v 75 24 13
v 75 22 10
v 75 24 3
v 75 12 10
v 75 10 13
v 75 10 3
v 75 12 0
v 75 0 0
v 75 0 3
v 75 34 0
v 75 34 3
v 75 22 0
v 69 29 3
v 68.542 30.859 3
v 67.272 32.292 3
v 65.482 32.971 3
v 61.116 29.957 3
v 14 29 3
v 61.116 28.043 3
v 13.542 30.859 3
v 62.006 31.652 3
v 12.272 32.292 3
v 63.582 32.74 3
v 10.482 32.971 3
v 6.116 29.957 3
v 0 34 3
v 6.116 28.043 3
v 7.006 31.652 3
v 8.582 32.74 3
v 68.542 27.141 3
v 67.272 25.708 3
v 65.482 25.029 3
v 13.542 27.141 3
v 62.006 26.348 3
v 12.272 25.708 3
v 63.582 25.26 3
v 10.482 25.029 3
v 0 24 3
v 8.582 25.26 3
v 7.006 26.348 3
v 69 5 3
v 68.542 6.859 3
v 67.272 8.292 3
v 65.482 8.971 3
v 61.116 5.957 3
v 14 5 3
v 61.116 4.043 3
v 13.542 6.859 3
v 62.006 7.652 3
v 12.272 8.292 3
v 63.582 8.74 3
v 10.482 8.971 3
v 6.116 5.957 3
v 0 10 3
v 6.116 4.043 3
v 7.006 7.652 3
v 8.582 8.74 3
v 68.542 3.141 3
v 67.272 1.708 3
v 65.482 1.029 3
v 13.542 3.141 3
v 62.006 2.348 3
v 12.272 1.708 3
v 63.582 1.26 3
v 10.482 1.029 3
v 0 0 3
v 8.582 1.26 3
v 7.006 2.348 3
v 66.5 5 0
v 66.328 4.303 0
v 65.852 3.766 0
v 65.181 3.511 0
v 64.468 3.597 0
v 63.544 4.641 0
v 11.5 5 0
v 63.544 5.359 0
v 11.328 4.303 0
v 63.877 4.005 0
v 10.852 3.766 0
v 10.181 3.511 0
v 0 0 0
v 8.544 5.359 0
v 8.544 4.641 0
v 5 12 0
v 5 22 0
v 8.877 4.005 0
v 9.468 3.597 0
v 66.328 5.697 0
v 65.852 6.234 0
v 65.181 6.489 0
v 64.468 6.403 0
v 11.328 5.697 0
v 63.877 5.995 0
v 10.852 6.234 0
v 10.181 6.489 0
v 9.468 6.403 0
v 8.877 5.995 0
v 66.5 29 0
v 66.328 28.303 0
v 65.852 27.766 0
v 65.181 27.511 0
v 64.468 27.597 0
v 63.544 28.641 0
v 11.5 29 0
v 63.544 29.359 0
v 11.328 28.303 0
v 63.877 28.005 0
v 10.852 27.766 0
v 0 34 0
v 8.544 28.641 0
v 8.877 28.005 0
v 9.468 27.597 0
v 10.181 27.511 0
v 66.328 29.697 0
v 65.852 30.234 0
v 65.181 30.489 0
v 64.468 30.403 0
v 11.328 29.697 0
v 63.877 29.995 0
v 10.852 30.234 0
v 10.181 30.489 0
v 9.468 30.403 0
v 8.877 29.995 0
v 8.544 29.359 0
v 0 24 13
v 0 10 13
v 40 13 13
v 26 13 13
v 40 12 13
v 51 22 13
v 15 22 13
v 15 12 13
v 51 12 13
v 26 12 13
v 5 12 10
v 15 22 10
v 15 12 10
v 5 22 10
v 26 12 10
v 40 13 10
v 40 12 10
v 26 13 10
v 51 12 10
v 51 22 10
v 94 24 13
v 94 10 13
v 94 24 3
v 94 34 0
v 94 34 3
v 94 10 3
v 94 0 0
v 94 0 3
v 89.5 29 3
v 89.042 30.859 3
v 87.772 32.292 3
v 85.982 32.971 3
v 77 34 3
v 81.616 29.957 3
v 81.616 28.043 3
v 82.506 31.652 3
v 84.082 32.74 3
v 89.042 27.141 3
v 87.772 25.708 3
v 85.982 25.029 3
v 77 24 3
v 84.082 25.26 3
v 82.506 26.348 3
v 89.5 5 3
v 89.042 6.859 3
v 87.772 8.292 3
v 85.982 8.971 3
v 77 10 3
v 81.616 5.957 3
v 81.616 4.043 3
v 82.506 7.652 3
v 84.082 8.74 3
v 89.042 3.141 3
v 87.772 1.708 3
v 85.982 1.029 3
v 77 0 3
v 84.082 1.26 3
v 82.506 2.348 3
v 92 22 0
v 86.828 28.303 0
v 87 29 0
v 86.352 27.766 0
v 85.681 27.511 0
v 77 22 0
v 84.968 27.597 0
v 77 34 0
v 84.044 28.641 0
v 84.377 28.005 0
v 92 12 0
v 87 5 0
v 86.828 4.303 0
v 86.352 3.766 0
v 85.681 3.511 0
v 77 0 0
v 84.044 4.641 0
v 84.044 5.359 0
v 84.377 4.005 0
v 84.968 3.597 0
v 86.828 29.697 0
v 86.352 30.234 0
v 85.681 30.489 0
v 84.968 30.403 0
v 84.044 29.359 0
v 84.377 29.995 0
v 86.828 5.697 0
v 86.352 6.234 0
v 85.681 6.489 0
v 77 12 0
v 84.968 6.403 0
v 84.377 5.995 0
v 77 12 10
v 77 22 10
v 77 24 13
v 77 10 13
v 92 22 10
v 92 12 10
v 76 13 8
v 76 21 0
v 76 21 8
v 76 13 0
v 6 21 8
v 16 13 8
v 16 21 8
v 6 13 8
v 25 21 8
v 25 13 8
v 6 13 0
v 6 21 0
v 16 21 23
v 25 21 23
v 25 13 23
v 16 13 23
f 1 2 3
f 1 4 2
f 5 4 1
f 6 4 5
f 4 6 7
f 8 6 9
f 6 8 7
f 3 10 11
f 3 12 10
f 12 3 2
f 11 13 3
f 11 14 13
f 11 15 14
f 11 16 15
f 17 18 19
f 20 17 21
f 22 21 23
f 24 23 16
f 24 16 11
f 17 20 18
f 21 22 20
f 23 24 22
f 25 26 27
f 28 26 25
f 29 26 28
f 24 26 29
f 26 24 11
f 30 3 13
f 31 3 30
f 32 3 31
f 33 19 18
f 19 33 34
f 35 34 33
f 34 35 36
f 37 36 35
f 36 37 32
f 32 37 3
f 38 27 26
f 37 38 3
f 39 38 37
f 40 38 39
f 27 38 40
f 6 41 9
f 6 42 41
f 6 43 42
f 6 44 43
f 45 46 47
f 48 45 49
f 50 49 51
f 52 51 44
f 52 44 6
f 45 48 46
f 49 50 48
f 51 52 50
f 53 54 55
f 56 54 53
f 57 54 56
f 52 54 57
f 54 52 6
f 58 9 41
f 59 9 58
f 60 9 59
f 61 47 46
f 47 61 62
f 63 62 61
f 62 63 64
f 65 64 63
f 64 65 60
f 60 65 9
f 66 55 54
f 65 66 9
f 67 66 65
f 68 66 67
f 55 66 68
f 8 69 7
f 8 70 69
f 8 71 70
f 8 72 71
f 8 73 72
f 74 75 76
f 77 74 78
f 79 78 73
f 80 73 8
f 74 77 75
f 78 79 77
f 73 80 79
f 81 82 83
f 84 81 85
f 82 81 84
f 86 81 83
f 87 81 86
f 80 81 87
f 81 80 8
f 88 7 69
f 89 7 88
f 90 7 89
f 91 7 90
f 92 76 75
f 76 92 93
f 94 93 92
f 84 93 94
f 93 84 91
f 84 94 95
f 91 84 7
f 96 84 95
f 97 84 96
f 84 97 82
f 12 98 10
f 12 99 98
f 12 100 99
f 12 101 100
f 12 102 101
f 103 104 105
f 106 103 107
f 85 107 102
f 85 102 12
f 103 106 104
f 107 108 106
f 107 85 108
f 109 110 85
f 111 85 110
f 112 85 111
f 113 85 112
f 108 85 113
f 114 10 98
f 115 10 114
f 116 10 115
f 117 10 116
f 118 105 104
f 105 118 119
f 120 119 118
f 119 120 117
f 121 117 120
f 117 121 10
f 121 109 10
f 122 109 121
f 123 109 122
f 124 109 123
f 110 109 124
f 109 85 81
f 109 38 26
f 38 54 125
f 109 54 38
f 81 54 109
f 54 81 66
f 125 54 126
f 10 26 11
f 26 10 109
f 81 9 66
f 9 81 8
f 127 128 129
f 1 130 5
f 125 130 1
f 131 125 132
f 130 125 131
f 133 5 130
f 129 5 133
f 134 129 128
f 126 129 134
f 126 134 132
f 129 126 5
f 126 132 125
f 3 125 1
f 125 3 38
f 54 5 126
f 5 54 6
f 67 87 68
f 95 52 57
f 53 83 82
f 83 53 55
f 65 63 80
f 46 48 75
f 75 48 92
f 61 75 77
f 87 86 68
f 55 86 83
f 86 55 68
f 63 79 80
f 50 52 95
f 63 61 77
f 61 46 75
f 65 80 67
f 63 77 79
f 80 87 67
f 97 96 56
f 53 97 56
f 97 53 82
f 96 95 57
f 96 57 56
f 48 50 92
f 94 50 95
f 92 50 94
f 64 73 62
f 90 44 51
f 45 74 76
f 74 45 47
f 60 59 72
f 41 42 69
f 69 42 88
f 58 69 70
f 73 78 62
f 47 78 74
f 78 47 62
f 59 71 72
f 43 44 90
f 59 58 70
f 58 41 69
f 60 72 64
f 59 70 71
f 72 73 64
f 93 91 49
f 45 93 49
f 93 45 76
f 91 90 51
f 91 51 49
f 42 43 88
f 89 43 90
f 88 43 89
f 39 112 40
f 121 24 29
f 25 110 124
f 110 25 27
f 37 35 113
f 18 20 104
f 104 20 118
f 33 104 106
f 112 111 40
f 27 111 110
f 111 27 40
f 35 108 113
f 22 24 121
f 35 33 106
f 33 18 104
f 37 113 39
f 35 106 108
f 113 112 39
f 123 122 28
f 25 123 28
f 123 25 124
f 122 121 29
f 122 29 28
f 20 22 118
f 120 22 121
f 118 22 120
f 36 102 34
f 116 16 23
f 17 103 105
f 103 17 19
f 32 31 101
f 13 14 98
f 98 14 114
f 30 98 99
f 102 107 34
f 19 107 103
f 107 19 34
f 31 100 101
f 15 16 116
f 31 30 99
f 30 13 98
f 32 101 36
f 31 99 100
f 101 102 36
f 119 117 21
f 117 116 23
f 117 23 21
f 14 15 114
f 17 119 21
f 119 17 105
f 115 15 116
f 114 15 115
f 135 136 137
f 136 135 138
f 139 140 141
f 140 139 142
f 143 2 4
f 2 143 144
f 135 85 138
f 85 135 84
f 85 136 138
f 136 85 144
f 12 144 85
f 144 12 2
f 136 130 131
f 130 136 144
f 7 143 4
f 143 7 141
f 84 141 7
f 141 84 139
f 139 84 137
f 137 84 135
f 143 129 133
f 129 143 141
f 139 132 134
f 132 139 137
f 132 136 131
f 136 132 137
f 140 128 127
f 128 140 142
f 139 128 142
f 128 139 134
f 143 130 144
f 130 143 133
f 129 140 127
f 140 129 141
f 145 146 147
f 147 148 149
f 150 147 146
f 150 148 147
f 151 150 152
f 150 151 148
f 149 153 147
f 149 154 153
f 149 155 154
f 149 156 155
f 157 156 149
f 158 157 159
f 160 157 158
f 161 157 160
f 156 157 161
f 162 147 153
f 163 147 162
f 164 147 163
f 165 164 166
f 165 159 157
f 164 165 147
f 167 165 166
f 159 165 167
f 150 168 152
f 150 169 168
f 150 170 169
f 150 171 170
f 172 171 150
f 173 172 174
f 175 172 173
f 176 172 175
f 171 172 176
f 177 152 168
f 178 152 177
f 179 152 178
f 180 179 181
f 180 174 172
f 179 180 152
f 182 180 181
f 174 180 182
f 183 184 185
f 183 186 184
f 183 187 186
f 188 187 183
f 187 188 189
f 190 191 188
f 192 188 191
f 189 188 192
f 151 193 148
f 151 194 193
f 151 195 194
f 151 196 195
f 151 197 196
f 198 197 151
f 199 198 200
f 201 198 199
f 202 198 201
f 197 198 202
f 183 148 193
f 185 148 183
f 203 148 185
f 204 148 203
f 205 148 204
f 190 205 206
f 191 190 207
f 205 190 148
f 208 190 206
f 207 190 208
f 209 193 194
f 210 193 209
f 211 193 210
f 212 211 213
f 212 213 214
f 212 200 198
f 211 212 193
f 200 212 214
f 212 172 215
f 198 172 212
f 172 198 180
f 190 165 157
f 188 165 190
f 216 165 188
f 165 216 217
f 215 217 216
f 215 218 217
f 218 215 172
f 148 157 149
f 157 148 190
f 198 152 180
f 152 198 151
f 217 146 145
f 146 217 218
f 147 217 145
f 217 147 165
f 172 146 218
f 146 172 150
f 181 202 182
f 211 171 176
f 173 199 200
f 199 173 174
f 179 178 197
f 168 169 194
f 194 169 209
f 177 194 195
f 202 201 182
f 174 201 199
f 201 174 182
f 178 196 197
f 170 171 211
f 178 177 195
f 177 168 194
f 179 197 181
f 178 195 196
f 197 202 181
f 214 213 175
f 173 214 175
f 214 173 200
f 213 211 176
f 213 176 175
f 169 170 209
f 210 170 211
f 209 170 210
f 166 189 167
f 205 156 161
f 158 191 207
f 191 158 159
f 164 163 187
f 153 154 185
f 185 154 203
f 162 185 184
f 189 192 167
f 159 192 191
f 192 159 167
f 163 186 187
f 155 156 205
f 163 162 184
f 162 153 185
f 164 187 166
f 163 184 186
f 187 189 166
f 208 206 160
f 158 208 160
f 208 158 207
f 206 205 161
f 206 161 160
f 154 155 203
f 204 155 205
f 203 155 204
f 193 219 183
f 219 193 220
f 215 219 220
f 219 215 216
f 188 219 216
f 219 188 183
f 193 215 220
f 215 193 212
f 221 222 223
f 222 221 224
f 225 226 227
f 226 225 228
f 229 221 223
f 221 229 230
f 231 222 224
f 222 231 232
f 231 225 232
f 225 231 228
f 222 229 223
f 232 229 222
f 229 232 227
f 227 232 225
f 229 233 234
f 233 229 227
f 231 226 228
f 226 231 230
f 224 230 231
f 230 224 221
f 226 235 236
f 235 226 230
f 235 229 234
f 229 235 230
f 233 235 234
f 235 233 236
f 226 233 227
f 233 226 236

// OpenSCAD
vyska = 8; // the latch height
sirka = 8; // the latch width
draha = 15; // the length of the latch
madlo_v = 15; // height of handrail

module telo()
{
    difference()
    {
        union()
        {
            translate([0,0,0]) cube([(60+draha),(sirka+26),3]);
            translate([0,10,0]) cube([(60+draha),(sirka+6),(vyska+5)]);
        }
        union()
        {
            translate([10,5,0]) cylinder(d1=3,d2=8,h=3);
            translate([(50+draha),5,0]) cylinder(d1=3,d2=8,h=3);
            translate([10,(sirka+21),0]) cylinder(d1=3,d2=8,h=3);
            translate([(50+draha),(sirka+21),0]) cylinder(d1=3,d2=8,h=3);
 
            translate([5,12,0]) cube([(draha+64),(sirka+2),(vyska+2)]);

            translate([15,13,0]) cube([(draha+20),(sirka+1),(vyska+6)]);

            translate([15,12,0]) cube([11,(sirka+2),(vyska+6)]);
            translate([(draha+25),12,0]) cube([11,(sirka+2),(vyska+6)]);
        }
    }
}

module zamek()
{
    difference()
    {
        union()
        {
            translate([(draha+62),0,0]) cube([(draha+2),(sirka+26),3]);
            translate([(draha+62),10,0]) cube([(draha+2),(sirka+6),(vyska+5)]);
        }
        union()
        {
            translate([(((draha+62)+((draha+2)/2))),5,0]) cylinder(d1=3,d2=8,h=3);
            translate([(((draha+62)+((draha+2)/2))),(sirka+21),0]) cylinder(d1=3,d2=8,h=3);
            translate([(draha+62),12,0]) cube([draha,(sirka+2),(vyska+2)]);
        }
    }
}

module jezdec()
{
     $a = 00;
     translate([6 + $a,13,0]) cube([(55+draha),sirka,vyska]);
     translate([16 + $a,13,vyska]) cube([9,sirka,madlo_v]);
}

telo();
zamek();
jezdec();
